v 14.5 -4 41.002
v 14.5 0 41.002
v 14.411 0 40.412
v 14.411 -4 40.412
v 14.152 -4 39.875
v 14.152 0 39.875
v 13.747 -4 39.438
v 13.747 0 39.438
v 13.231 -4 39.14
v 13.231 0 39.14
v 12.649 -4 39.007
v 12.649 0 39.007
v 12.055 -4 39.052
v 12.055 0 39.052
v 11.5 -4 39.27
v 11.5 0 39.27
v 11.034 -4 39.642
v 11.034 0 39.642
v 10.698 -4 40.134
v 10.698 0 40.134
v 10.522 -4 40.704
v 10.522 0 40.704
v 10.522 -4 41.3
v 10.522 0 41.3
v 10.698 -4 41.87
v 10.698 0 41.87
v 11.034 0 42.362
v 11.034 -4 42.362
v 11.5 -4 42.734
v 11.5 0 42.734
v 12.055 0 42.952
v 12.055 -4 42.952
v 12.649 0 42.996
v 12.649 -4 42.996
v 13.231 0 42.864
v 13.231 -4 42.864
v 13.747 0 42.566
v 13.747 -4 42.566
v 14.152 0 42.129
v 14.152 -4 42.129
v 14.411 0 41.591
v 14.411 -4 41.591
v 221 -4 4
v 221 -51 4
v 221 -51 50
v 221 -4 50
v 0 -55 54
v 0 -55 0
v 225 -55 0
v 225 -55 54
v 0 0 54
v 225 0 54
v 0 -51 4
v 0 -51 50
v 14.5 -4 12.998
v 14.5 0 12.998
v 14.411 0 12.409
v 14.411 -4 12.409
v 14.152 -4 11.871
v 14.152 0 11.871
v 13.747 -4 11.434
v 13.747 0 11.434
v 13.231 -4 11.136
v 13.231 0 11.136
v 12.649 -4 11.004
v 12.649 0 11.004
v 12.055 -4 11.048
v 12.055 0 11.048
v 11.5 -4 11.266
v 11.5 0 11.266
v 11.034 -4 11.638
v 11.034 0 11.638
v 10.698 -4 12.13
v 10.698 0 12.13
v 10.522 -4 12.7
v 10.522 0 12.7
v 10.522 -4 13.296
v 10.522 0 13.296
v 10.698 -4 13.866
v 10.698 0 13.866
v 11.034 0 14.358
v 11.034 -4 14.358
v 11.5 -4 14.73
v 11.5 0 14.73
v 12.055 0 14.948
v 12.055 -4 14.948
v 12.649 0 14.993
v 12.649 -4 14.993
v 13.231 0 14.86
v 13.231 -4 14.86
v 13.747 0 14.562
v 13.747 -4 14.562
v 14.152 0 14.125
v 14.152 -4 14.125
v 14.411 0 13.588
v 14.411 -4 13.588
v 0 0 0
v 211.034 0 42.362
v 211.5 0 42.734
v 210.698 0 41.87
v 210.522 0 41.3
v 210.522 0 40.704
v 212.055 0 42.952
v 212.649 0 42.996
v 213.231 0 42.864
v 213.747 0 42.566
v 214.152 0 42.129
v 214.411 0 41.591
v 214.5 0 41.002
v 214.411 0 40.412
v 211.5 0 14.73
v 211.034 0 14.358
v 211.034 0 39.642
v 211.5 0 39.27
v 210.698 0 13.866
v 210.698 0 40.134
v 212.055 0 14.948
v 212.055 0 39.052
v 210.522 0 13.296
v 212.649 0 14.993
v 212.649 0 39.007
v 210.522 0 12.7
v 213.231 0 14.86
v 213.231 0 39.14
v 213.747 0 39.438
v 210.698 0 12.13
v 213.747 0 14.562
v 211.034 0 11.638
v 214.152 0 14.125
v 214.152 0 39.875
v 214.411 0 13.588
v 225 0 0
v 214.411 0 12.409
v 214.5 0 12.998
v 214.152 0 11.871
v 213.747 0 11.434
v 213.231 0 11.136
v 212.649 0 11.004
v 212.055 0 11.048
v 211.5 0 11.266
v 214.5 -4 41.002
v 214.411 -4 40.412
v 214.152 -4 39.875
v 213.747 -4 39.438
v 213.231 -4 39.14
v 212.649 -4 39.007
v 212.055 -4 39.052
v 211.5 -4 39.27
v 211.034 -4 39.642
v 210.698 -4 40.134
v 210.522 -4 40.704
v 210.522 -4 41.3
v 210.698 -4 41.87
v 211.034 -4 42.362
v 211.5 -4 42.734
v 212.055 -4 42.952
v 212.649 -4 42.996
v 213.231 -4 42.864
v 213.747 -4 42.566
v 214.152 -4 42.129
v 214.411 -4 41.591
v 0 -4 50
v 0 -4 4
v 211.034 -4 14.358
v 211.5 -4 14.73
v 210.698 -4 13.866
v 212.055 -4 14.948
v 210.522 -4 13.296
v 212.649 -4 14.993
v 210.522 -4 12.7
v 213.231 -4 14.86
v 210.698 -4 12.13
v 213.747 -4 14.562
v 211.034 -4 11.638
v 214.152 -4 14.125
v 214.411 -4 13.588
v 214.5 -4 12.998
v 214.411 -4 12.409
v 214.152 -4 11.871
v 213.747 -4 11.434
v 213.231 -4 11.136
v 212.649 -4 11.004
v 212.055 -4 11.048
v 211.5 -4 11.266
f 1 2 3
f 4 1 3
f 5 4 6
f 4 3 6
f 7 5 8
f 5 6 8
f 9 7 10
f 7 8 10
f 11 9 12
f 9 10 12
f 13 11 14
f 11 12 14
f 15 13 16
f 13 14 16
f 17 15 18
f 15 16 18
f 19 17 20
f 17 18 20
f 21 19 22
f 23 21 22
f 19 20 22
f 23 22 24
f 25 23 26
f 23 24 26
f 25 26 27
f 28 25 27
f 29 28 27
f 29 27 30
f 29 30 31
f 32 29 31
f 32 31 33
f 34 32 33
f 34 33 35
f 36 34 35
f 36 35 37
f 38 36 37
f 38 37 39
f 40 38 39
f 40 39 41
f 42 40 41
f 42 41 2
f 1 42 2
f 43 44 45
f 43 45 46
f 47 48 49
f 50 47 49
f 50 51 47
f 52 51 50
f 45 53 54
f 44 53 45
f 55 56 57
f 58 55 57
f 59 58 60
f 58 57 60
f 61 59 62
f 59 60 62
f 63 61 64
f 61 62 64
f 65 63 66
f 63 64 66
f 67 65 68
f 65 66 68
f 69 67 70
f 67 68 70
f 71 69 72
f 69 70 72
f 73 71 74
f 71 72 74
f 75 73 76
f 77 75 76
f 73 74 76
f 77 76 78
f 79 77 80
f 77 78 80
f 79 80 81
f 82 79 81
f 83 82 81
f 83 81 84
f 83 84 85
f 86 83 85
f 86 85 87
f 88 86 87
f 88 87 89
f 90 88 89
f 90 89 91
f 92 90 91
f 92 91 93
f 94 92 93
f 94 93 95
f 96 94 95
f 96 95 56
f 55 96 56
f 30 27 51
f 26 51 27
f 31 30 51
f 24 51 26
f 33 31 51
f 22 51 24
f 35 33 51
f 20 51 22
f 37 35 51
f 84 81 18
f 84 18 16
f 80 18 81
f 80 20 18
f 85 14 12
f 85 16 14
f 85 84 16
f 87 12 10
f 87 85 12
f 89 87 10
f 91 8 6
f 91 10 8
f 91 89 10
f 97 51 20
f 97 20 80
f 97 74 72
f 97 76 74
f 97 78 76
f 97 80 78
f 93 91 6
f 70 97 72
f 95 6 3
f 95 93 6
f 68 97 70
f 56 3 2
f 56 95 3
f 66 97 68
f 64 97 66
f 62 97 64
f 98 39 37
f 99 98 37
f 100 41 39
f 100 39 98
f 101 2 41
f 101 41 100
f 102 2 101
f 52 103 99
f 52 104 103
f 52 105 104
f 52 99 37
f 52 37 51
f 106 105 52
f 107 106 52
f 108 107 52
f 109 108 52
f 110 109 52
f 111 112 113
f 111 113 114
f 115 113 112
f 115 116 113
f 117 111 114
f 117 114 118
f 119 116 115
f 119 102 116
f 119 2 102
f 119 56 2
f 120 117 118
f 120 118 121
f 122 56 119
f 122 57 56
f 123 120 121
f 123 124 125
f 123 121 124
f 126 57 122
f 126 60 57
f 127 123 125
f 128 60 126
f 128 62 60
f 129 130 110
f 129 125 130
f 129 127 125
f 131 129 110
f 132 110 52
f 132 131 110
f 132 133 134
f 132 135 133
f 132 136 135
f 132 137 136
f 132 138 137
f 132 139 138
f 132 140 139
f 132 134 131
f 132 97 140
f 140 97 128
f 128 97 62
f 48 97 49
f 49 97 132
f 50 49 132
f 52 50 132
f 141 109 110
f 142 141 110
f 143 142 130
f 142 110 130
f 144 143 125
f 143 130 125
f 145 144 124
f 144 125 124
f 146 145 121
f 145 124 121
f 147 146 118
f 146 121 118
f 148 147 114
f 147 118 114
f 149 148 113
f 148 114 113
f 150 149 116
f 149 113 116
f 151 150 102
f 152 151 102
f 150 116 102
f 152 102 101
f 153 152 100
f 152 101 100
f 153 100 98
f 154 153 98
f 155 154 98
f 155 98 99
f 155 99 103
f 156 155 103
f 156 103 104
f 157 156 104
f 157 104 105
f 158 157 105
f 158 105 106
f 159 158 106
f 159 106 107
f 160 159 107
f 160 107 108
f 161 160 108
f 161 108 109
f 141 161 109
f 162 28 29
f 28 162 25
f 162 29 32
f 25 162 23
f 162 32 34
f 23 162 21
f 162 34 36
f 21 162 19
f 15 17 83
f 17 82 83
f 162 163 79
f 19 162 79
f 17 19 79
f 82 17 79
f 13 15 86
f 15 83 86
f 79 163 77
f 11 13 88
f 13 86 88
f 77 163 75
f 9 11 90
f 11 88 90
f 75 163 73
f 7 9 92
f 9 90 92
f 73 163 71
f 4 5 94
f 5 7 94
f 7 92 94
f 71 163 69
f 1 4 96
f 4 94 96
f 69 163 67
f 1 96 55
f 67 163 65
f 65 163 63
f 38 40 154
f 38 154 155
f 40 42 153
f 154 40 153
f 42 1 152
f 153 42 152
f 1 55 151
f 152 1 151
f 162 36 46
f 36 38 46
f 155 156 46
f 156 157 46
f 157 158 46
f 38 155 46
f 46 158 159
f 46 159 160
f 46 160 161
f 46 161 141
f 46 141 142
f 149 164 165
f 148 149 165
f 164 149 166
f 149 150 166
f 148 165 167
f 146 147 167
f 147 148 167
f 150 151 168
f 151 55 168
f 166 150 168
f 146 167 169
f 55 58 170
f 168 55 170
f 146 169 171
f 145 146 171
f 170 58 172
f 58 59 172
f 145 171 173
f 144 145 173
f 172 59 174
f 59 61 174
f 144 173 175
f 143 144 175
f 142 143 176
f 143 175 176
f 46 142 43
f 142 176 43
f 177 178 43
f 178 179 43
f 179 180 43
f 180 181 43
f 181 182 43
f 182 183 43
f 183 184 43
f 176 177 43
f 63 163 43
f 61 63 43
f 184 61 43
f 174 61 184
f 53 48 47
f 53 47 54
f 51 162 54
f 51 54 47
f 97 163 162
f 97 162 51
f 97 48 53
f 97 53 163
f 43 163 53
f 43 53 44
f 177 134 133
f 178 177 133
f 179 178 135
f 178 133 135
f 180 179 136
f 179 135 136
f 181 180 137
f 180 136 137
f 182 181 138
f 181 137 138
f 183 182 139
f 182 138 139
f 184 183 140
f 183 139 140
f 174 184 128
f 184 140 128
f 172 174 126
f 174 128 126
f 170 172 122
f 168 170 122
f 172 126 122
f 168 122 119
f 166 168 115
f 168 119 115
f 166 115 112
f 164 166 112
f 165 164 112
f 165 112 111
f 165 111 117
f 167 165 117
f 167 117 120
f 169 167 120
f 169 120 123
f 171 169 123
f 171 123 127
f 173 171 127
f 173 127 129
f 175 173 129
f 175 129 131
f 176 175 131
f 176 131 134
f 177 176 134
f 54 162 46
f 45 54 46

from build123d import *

# Parameters (mm, degrees)
SKETCH1_W           = 225
SKETCH1_H           = 55
BOSS_EXTRUDE1_DEPTH = 54
SHELL1_T            = -4
SKETCH2_R           = 2
CUT_EXTRUDE1_DEPTH  = 10


with BuildPart() as part:
    # Sketch1 → Boss-Extrude1 (new body)
    with BuildSketch(Plane.XY):
        with Locations((112.5, -27.5)):
            Rectangle(SKETCH1_W, SKETCH1_H)
    extrude(amount=BOSS_EXTRUDE1_DEPTH)

    # Shell1
    shell1_openings = [part.faces().sort_by_distance(p)[0] for p in [
        (0, -27.5, 27),
    ]]
    offset(amount=SHELL1_T, openings=shell1_openings, kind=Kind.INTERSECTION)

    # Sketch2 → Cut-Extrude1 (cut)
    with BuildSketch(Plane(origin=(0, 0, 0), x_dir=(1, 0, 0), z_dir=(0, 1, 0))):
        with Locations((12.5, -12.998097245)):
            Circle(SKETCH2_R)
        with Locations((212.5, -12.998097245)):
            Circle(SKETCH2_R)
        with Locations((212.5, -41.001902755)):
            Circle(SKETCH2_R)
        with Locations((12.5, -41.001902755)):
            Circle(SKETCH2_R)
    extrude(amount=-CUT_EXTRUDE1_DEPTH, mode=Mode.SUBTRACT)


solid = part.part
